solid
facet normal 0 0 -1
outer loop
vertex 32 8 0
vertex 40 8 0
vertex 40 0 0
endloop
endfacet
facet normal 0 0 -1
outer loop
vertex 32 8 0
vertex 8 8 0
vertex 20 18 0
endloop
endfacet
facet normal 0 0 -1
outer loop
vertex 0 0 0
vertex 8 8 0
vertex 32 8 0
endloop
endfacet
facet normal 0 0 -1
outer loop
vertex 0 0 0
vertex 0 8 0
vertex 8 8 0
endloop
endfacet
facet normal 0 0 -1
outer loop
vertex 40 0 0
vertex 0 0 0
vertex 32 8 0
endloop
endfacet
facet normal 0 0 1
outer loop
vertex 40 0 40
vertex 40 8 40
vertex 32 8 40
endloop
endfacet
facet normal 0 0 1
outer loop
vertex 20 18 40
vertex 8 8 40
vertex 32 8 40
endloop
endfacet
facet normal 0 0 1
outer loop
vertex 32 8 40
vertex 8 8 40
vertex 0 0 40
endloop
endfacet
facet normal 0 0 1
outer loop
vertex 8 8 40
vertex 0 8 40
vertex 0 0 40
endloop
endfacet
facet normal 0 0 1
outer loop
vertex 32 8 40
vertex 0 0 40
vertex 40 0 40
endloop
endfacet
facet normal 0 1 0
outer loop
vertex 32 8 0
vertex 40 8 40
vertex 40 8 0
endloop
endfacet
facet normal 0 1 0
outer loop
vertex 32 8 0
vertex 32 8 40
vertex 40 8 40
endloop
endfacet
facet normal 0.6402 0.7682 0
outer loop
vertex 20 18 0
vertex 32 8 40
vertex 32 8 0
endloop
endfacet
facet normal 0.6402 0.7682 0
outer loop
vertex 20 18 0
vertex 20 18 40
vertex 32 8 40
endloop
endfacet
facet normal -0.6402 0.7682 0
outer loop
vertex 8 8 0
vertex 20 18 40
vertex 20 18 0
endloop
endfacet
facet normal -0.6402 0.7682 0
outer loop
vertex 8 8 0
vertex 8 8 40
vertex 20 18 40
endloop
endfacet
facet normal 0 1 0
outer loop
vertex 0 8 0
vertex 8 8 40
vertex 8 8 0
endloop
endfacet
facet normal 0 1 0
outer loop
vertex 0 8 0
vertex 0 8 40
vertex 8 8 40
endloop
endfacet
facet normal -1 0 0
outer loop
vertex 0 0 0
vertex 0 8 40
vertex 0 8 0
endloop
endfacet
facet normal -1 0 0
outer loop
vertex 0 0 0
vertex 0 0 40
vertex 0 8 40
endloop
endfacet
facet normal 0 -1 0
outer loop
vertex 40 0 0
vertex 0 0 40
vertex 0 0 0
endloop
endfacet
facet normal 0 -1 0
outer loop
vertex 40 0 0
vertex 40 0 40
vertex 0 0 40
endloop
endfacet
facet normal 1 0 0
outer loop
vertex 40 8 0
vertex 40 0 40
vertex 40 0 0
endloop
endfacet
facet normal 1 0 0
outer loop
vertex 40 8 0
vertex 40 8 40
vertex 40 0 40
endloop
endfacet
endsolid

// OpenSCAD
$fn = 32;

// ----------------------------------------------------------------------
// V guide rail: vrib, 40 mm wide
// ----------------------------------------------------------------------

// --- parameters (mm) ---
rail_w = 40;              // rail width, X
base_t = 8;               // base plate thickness
v_depth = 10;             // V feature depth / height
v_half_w = 12;            // half width of the V at the base face
plate_t = 40;             // rail length, Z (the extrusion height)

profile = [[0, 0], [40, 0], [40, 8], [32, 8], [20, 18], [8, 8], [0, 8]];  // primary outline, 7 points, counter clockwise

// --- the one profile operation ---
linear_extrude(height = plate_t) polygon(points = profile);
